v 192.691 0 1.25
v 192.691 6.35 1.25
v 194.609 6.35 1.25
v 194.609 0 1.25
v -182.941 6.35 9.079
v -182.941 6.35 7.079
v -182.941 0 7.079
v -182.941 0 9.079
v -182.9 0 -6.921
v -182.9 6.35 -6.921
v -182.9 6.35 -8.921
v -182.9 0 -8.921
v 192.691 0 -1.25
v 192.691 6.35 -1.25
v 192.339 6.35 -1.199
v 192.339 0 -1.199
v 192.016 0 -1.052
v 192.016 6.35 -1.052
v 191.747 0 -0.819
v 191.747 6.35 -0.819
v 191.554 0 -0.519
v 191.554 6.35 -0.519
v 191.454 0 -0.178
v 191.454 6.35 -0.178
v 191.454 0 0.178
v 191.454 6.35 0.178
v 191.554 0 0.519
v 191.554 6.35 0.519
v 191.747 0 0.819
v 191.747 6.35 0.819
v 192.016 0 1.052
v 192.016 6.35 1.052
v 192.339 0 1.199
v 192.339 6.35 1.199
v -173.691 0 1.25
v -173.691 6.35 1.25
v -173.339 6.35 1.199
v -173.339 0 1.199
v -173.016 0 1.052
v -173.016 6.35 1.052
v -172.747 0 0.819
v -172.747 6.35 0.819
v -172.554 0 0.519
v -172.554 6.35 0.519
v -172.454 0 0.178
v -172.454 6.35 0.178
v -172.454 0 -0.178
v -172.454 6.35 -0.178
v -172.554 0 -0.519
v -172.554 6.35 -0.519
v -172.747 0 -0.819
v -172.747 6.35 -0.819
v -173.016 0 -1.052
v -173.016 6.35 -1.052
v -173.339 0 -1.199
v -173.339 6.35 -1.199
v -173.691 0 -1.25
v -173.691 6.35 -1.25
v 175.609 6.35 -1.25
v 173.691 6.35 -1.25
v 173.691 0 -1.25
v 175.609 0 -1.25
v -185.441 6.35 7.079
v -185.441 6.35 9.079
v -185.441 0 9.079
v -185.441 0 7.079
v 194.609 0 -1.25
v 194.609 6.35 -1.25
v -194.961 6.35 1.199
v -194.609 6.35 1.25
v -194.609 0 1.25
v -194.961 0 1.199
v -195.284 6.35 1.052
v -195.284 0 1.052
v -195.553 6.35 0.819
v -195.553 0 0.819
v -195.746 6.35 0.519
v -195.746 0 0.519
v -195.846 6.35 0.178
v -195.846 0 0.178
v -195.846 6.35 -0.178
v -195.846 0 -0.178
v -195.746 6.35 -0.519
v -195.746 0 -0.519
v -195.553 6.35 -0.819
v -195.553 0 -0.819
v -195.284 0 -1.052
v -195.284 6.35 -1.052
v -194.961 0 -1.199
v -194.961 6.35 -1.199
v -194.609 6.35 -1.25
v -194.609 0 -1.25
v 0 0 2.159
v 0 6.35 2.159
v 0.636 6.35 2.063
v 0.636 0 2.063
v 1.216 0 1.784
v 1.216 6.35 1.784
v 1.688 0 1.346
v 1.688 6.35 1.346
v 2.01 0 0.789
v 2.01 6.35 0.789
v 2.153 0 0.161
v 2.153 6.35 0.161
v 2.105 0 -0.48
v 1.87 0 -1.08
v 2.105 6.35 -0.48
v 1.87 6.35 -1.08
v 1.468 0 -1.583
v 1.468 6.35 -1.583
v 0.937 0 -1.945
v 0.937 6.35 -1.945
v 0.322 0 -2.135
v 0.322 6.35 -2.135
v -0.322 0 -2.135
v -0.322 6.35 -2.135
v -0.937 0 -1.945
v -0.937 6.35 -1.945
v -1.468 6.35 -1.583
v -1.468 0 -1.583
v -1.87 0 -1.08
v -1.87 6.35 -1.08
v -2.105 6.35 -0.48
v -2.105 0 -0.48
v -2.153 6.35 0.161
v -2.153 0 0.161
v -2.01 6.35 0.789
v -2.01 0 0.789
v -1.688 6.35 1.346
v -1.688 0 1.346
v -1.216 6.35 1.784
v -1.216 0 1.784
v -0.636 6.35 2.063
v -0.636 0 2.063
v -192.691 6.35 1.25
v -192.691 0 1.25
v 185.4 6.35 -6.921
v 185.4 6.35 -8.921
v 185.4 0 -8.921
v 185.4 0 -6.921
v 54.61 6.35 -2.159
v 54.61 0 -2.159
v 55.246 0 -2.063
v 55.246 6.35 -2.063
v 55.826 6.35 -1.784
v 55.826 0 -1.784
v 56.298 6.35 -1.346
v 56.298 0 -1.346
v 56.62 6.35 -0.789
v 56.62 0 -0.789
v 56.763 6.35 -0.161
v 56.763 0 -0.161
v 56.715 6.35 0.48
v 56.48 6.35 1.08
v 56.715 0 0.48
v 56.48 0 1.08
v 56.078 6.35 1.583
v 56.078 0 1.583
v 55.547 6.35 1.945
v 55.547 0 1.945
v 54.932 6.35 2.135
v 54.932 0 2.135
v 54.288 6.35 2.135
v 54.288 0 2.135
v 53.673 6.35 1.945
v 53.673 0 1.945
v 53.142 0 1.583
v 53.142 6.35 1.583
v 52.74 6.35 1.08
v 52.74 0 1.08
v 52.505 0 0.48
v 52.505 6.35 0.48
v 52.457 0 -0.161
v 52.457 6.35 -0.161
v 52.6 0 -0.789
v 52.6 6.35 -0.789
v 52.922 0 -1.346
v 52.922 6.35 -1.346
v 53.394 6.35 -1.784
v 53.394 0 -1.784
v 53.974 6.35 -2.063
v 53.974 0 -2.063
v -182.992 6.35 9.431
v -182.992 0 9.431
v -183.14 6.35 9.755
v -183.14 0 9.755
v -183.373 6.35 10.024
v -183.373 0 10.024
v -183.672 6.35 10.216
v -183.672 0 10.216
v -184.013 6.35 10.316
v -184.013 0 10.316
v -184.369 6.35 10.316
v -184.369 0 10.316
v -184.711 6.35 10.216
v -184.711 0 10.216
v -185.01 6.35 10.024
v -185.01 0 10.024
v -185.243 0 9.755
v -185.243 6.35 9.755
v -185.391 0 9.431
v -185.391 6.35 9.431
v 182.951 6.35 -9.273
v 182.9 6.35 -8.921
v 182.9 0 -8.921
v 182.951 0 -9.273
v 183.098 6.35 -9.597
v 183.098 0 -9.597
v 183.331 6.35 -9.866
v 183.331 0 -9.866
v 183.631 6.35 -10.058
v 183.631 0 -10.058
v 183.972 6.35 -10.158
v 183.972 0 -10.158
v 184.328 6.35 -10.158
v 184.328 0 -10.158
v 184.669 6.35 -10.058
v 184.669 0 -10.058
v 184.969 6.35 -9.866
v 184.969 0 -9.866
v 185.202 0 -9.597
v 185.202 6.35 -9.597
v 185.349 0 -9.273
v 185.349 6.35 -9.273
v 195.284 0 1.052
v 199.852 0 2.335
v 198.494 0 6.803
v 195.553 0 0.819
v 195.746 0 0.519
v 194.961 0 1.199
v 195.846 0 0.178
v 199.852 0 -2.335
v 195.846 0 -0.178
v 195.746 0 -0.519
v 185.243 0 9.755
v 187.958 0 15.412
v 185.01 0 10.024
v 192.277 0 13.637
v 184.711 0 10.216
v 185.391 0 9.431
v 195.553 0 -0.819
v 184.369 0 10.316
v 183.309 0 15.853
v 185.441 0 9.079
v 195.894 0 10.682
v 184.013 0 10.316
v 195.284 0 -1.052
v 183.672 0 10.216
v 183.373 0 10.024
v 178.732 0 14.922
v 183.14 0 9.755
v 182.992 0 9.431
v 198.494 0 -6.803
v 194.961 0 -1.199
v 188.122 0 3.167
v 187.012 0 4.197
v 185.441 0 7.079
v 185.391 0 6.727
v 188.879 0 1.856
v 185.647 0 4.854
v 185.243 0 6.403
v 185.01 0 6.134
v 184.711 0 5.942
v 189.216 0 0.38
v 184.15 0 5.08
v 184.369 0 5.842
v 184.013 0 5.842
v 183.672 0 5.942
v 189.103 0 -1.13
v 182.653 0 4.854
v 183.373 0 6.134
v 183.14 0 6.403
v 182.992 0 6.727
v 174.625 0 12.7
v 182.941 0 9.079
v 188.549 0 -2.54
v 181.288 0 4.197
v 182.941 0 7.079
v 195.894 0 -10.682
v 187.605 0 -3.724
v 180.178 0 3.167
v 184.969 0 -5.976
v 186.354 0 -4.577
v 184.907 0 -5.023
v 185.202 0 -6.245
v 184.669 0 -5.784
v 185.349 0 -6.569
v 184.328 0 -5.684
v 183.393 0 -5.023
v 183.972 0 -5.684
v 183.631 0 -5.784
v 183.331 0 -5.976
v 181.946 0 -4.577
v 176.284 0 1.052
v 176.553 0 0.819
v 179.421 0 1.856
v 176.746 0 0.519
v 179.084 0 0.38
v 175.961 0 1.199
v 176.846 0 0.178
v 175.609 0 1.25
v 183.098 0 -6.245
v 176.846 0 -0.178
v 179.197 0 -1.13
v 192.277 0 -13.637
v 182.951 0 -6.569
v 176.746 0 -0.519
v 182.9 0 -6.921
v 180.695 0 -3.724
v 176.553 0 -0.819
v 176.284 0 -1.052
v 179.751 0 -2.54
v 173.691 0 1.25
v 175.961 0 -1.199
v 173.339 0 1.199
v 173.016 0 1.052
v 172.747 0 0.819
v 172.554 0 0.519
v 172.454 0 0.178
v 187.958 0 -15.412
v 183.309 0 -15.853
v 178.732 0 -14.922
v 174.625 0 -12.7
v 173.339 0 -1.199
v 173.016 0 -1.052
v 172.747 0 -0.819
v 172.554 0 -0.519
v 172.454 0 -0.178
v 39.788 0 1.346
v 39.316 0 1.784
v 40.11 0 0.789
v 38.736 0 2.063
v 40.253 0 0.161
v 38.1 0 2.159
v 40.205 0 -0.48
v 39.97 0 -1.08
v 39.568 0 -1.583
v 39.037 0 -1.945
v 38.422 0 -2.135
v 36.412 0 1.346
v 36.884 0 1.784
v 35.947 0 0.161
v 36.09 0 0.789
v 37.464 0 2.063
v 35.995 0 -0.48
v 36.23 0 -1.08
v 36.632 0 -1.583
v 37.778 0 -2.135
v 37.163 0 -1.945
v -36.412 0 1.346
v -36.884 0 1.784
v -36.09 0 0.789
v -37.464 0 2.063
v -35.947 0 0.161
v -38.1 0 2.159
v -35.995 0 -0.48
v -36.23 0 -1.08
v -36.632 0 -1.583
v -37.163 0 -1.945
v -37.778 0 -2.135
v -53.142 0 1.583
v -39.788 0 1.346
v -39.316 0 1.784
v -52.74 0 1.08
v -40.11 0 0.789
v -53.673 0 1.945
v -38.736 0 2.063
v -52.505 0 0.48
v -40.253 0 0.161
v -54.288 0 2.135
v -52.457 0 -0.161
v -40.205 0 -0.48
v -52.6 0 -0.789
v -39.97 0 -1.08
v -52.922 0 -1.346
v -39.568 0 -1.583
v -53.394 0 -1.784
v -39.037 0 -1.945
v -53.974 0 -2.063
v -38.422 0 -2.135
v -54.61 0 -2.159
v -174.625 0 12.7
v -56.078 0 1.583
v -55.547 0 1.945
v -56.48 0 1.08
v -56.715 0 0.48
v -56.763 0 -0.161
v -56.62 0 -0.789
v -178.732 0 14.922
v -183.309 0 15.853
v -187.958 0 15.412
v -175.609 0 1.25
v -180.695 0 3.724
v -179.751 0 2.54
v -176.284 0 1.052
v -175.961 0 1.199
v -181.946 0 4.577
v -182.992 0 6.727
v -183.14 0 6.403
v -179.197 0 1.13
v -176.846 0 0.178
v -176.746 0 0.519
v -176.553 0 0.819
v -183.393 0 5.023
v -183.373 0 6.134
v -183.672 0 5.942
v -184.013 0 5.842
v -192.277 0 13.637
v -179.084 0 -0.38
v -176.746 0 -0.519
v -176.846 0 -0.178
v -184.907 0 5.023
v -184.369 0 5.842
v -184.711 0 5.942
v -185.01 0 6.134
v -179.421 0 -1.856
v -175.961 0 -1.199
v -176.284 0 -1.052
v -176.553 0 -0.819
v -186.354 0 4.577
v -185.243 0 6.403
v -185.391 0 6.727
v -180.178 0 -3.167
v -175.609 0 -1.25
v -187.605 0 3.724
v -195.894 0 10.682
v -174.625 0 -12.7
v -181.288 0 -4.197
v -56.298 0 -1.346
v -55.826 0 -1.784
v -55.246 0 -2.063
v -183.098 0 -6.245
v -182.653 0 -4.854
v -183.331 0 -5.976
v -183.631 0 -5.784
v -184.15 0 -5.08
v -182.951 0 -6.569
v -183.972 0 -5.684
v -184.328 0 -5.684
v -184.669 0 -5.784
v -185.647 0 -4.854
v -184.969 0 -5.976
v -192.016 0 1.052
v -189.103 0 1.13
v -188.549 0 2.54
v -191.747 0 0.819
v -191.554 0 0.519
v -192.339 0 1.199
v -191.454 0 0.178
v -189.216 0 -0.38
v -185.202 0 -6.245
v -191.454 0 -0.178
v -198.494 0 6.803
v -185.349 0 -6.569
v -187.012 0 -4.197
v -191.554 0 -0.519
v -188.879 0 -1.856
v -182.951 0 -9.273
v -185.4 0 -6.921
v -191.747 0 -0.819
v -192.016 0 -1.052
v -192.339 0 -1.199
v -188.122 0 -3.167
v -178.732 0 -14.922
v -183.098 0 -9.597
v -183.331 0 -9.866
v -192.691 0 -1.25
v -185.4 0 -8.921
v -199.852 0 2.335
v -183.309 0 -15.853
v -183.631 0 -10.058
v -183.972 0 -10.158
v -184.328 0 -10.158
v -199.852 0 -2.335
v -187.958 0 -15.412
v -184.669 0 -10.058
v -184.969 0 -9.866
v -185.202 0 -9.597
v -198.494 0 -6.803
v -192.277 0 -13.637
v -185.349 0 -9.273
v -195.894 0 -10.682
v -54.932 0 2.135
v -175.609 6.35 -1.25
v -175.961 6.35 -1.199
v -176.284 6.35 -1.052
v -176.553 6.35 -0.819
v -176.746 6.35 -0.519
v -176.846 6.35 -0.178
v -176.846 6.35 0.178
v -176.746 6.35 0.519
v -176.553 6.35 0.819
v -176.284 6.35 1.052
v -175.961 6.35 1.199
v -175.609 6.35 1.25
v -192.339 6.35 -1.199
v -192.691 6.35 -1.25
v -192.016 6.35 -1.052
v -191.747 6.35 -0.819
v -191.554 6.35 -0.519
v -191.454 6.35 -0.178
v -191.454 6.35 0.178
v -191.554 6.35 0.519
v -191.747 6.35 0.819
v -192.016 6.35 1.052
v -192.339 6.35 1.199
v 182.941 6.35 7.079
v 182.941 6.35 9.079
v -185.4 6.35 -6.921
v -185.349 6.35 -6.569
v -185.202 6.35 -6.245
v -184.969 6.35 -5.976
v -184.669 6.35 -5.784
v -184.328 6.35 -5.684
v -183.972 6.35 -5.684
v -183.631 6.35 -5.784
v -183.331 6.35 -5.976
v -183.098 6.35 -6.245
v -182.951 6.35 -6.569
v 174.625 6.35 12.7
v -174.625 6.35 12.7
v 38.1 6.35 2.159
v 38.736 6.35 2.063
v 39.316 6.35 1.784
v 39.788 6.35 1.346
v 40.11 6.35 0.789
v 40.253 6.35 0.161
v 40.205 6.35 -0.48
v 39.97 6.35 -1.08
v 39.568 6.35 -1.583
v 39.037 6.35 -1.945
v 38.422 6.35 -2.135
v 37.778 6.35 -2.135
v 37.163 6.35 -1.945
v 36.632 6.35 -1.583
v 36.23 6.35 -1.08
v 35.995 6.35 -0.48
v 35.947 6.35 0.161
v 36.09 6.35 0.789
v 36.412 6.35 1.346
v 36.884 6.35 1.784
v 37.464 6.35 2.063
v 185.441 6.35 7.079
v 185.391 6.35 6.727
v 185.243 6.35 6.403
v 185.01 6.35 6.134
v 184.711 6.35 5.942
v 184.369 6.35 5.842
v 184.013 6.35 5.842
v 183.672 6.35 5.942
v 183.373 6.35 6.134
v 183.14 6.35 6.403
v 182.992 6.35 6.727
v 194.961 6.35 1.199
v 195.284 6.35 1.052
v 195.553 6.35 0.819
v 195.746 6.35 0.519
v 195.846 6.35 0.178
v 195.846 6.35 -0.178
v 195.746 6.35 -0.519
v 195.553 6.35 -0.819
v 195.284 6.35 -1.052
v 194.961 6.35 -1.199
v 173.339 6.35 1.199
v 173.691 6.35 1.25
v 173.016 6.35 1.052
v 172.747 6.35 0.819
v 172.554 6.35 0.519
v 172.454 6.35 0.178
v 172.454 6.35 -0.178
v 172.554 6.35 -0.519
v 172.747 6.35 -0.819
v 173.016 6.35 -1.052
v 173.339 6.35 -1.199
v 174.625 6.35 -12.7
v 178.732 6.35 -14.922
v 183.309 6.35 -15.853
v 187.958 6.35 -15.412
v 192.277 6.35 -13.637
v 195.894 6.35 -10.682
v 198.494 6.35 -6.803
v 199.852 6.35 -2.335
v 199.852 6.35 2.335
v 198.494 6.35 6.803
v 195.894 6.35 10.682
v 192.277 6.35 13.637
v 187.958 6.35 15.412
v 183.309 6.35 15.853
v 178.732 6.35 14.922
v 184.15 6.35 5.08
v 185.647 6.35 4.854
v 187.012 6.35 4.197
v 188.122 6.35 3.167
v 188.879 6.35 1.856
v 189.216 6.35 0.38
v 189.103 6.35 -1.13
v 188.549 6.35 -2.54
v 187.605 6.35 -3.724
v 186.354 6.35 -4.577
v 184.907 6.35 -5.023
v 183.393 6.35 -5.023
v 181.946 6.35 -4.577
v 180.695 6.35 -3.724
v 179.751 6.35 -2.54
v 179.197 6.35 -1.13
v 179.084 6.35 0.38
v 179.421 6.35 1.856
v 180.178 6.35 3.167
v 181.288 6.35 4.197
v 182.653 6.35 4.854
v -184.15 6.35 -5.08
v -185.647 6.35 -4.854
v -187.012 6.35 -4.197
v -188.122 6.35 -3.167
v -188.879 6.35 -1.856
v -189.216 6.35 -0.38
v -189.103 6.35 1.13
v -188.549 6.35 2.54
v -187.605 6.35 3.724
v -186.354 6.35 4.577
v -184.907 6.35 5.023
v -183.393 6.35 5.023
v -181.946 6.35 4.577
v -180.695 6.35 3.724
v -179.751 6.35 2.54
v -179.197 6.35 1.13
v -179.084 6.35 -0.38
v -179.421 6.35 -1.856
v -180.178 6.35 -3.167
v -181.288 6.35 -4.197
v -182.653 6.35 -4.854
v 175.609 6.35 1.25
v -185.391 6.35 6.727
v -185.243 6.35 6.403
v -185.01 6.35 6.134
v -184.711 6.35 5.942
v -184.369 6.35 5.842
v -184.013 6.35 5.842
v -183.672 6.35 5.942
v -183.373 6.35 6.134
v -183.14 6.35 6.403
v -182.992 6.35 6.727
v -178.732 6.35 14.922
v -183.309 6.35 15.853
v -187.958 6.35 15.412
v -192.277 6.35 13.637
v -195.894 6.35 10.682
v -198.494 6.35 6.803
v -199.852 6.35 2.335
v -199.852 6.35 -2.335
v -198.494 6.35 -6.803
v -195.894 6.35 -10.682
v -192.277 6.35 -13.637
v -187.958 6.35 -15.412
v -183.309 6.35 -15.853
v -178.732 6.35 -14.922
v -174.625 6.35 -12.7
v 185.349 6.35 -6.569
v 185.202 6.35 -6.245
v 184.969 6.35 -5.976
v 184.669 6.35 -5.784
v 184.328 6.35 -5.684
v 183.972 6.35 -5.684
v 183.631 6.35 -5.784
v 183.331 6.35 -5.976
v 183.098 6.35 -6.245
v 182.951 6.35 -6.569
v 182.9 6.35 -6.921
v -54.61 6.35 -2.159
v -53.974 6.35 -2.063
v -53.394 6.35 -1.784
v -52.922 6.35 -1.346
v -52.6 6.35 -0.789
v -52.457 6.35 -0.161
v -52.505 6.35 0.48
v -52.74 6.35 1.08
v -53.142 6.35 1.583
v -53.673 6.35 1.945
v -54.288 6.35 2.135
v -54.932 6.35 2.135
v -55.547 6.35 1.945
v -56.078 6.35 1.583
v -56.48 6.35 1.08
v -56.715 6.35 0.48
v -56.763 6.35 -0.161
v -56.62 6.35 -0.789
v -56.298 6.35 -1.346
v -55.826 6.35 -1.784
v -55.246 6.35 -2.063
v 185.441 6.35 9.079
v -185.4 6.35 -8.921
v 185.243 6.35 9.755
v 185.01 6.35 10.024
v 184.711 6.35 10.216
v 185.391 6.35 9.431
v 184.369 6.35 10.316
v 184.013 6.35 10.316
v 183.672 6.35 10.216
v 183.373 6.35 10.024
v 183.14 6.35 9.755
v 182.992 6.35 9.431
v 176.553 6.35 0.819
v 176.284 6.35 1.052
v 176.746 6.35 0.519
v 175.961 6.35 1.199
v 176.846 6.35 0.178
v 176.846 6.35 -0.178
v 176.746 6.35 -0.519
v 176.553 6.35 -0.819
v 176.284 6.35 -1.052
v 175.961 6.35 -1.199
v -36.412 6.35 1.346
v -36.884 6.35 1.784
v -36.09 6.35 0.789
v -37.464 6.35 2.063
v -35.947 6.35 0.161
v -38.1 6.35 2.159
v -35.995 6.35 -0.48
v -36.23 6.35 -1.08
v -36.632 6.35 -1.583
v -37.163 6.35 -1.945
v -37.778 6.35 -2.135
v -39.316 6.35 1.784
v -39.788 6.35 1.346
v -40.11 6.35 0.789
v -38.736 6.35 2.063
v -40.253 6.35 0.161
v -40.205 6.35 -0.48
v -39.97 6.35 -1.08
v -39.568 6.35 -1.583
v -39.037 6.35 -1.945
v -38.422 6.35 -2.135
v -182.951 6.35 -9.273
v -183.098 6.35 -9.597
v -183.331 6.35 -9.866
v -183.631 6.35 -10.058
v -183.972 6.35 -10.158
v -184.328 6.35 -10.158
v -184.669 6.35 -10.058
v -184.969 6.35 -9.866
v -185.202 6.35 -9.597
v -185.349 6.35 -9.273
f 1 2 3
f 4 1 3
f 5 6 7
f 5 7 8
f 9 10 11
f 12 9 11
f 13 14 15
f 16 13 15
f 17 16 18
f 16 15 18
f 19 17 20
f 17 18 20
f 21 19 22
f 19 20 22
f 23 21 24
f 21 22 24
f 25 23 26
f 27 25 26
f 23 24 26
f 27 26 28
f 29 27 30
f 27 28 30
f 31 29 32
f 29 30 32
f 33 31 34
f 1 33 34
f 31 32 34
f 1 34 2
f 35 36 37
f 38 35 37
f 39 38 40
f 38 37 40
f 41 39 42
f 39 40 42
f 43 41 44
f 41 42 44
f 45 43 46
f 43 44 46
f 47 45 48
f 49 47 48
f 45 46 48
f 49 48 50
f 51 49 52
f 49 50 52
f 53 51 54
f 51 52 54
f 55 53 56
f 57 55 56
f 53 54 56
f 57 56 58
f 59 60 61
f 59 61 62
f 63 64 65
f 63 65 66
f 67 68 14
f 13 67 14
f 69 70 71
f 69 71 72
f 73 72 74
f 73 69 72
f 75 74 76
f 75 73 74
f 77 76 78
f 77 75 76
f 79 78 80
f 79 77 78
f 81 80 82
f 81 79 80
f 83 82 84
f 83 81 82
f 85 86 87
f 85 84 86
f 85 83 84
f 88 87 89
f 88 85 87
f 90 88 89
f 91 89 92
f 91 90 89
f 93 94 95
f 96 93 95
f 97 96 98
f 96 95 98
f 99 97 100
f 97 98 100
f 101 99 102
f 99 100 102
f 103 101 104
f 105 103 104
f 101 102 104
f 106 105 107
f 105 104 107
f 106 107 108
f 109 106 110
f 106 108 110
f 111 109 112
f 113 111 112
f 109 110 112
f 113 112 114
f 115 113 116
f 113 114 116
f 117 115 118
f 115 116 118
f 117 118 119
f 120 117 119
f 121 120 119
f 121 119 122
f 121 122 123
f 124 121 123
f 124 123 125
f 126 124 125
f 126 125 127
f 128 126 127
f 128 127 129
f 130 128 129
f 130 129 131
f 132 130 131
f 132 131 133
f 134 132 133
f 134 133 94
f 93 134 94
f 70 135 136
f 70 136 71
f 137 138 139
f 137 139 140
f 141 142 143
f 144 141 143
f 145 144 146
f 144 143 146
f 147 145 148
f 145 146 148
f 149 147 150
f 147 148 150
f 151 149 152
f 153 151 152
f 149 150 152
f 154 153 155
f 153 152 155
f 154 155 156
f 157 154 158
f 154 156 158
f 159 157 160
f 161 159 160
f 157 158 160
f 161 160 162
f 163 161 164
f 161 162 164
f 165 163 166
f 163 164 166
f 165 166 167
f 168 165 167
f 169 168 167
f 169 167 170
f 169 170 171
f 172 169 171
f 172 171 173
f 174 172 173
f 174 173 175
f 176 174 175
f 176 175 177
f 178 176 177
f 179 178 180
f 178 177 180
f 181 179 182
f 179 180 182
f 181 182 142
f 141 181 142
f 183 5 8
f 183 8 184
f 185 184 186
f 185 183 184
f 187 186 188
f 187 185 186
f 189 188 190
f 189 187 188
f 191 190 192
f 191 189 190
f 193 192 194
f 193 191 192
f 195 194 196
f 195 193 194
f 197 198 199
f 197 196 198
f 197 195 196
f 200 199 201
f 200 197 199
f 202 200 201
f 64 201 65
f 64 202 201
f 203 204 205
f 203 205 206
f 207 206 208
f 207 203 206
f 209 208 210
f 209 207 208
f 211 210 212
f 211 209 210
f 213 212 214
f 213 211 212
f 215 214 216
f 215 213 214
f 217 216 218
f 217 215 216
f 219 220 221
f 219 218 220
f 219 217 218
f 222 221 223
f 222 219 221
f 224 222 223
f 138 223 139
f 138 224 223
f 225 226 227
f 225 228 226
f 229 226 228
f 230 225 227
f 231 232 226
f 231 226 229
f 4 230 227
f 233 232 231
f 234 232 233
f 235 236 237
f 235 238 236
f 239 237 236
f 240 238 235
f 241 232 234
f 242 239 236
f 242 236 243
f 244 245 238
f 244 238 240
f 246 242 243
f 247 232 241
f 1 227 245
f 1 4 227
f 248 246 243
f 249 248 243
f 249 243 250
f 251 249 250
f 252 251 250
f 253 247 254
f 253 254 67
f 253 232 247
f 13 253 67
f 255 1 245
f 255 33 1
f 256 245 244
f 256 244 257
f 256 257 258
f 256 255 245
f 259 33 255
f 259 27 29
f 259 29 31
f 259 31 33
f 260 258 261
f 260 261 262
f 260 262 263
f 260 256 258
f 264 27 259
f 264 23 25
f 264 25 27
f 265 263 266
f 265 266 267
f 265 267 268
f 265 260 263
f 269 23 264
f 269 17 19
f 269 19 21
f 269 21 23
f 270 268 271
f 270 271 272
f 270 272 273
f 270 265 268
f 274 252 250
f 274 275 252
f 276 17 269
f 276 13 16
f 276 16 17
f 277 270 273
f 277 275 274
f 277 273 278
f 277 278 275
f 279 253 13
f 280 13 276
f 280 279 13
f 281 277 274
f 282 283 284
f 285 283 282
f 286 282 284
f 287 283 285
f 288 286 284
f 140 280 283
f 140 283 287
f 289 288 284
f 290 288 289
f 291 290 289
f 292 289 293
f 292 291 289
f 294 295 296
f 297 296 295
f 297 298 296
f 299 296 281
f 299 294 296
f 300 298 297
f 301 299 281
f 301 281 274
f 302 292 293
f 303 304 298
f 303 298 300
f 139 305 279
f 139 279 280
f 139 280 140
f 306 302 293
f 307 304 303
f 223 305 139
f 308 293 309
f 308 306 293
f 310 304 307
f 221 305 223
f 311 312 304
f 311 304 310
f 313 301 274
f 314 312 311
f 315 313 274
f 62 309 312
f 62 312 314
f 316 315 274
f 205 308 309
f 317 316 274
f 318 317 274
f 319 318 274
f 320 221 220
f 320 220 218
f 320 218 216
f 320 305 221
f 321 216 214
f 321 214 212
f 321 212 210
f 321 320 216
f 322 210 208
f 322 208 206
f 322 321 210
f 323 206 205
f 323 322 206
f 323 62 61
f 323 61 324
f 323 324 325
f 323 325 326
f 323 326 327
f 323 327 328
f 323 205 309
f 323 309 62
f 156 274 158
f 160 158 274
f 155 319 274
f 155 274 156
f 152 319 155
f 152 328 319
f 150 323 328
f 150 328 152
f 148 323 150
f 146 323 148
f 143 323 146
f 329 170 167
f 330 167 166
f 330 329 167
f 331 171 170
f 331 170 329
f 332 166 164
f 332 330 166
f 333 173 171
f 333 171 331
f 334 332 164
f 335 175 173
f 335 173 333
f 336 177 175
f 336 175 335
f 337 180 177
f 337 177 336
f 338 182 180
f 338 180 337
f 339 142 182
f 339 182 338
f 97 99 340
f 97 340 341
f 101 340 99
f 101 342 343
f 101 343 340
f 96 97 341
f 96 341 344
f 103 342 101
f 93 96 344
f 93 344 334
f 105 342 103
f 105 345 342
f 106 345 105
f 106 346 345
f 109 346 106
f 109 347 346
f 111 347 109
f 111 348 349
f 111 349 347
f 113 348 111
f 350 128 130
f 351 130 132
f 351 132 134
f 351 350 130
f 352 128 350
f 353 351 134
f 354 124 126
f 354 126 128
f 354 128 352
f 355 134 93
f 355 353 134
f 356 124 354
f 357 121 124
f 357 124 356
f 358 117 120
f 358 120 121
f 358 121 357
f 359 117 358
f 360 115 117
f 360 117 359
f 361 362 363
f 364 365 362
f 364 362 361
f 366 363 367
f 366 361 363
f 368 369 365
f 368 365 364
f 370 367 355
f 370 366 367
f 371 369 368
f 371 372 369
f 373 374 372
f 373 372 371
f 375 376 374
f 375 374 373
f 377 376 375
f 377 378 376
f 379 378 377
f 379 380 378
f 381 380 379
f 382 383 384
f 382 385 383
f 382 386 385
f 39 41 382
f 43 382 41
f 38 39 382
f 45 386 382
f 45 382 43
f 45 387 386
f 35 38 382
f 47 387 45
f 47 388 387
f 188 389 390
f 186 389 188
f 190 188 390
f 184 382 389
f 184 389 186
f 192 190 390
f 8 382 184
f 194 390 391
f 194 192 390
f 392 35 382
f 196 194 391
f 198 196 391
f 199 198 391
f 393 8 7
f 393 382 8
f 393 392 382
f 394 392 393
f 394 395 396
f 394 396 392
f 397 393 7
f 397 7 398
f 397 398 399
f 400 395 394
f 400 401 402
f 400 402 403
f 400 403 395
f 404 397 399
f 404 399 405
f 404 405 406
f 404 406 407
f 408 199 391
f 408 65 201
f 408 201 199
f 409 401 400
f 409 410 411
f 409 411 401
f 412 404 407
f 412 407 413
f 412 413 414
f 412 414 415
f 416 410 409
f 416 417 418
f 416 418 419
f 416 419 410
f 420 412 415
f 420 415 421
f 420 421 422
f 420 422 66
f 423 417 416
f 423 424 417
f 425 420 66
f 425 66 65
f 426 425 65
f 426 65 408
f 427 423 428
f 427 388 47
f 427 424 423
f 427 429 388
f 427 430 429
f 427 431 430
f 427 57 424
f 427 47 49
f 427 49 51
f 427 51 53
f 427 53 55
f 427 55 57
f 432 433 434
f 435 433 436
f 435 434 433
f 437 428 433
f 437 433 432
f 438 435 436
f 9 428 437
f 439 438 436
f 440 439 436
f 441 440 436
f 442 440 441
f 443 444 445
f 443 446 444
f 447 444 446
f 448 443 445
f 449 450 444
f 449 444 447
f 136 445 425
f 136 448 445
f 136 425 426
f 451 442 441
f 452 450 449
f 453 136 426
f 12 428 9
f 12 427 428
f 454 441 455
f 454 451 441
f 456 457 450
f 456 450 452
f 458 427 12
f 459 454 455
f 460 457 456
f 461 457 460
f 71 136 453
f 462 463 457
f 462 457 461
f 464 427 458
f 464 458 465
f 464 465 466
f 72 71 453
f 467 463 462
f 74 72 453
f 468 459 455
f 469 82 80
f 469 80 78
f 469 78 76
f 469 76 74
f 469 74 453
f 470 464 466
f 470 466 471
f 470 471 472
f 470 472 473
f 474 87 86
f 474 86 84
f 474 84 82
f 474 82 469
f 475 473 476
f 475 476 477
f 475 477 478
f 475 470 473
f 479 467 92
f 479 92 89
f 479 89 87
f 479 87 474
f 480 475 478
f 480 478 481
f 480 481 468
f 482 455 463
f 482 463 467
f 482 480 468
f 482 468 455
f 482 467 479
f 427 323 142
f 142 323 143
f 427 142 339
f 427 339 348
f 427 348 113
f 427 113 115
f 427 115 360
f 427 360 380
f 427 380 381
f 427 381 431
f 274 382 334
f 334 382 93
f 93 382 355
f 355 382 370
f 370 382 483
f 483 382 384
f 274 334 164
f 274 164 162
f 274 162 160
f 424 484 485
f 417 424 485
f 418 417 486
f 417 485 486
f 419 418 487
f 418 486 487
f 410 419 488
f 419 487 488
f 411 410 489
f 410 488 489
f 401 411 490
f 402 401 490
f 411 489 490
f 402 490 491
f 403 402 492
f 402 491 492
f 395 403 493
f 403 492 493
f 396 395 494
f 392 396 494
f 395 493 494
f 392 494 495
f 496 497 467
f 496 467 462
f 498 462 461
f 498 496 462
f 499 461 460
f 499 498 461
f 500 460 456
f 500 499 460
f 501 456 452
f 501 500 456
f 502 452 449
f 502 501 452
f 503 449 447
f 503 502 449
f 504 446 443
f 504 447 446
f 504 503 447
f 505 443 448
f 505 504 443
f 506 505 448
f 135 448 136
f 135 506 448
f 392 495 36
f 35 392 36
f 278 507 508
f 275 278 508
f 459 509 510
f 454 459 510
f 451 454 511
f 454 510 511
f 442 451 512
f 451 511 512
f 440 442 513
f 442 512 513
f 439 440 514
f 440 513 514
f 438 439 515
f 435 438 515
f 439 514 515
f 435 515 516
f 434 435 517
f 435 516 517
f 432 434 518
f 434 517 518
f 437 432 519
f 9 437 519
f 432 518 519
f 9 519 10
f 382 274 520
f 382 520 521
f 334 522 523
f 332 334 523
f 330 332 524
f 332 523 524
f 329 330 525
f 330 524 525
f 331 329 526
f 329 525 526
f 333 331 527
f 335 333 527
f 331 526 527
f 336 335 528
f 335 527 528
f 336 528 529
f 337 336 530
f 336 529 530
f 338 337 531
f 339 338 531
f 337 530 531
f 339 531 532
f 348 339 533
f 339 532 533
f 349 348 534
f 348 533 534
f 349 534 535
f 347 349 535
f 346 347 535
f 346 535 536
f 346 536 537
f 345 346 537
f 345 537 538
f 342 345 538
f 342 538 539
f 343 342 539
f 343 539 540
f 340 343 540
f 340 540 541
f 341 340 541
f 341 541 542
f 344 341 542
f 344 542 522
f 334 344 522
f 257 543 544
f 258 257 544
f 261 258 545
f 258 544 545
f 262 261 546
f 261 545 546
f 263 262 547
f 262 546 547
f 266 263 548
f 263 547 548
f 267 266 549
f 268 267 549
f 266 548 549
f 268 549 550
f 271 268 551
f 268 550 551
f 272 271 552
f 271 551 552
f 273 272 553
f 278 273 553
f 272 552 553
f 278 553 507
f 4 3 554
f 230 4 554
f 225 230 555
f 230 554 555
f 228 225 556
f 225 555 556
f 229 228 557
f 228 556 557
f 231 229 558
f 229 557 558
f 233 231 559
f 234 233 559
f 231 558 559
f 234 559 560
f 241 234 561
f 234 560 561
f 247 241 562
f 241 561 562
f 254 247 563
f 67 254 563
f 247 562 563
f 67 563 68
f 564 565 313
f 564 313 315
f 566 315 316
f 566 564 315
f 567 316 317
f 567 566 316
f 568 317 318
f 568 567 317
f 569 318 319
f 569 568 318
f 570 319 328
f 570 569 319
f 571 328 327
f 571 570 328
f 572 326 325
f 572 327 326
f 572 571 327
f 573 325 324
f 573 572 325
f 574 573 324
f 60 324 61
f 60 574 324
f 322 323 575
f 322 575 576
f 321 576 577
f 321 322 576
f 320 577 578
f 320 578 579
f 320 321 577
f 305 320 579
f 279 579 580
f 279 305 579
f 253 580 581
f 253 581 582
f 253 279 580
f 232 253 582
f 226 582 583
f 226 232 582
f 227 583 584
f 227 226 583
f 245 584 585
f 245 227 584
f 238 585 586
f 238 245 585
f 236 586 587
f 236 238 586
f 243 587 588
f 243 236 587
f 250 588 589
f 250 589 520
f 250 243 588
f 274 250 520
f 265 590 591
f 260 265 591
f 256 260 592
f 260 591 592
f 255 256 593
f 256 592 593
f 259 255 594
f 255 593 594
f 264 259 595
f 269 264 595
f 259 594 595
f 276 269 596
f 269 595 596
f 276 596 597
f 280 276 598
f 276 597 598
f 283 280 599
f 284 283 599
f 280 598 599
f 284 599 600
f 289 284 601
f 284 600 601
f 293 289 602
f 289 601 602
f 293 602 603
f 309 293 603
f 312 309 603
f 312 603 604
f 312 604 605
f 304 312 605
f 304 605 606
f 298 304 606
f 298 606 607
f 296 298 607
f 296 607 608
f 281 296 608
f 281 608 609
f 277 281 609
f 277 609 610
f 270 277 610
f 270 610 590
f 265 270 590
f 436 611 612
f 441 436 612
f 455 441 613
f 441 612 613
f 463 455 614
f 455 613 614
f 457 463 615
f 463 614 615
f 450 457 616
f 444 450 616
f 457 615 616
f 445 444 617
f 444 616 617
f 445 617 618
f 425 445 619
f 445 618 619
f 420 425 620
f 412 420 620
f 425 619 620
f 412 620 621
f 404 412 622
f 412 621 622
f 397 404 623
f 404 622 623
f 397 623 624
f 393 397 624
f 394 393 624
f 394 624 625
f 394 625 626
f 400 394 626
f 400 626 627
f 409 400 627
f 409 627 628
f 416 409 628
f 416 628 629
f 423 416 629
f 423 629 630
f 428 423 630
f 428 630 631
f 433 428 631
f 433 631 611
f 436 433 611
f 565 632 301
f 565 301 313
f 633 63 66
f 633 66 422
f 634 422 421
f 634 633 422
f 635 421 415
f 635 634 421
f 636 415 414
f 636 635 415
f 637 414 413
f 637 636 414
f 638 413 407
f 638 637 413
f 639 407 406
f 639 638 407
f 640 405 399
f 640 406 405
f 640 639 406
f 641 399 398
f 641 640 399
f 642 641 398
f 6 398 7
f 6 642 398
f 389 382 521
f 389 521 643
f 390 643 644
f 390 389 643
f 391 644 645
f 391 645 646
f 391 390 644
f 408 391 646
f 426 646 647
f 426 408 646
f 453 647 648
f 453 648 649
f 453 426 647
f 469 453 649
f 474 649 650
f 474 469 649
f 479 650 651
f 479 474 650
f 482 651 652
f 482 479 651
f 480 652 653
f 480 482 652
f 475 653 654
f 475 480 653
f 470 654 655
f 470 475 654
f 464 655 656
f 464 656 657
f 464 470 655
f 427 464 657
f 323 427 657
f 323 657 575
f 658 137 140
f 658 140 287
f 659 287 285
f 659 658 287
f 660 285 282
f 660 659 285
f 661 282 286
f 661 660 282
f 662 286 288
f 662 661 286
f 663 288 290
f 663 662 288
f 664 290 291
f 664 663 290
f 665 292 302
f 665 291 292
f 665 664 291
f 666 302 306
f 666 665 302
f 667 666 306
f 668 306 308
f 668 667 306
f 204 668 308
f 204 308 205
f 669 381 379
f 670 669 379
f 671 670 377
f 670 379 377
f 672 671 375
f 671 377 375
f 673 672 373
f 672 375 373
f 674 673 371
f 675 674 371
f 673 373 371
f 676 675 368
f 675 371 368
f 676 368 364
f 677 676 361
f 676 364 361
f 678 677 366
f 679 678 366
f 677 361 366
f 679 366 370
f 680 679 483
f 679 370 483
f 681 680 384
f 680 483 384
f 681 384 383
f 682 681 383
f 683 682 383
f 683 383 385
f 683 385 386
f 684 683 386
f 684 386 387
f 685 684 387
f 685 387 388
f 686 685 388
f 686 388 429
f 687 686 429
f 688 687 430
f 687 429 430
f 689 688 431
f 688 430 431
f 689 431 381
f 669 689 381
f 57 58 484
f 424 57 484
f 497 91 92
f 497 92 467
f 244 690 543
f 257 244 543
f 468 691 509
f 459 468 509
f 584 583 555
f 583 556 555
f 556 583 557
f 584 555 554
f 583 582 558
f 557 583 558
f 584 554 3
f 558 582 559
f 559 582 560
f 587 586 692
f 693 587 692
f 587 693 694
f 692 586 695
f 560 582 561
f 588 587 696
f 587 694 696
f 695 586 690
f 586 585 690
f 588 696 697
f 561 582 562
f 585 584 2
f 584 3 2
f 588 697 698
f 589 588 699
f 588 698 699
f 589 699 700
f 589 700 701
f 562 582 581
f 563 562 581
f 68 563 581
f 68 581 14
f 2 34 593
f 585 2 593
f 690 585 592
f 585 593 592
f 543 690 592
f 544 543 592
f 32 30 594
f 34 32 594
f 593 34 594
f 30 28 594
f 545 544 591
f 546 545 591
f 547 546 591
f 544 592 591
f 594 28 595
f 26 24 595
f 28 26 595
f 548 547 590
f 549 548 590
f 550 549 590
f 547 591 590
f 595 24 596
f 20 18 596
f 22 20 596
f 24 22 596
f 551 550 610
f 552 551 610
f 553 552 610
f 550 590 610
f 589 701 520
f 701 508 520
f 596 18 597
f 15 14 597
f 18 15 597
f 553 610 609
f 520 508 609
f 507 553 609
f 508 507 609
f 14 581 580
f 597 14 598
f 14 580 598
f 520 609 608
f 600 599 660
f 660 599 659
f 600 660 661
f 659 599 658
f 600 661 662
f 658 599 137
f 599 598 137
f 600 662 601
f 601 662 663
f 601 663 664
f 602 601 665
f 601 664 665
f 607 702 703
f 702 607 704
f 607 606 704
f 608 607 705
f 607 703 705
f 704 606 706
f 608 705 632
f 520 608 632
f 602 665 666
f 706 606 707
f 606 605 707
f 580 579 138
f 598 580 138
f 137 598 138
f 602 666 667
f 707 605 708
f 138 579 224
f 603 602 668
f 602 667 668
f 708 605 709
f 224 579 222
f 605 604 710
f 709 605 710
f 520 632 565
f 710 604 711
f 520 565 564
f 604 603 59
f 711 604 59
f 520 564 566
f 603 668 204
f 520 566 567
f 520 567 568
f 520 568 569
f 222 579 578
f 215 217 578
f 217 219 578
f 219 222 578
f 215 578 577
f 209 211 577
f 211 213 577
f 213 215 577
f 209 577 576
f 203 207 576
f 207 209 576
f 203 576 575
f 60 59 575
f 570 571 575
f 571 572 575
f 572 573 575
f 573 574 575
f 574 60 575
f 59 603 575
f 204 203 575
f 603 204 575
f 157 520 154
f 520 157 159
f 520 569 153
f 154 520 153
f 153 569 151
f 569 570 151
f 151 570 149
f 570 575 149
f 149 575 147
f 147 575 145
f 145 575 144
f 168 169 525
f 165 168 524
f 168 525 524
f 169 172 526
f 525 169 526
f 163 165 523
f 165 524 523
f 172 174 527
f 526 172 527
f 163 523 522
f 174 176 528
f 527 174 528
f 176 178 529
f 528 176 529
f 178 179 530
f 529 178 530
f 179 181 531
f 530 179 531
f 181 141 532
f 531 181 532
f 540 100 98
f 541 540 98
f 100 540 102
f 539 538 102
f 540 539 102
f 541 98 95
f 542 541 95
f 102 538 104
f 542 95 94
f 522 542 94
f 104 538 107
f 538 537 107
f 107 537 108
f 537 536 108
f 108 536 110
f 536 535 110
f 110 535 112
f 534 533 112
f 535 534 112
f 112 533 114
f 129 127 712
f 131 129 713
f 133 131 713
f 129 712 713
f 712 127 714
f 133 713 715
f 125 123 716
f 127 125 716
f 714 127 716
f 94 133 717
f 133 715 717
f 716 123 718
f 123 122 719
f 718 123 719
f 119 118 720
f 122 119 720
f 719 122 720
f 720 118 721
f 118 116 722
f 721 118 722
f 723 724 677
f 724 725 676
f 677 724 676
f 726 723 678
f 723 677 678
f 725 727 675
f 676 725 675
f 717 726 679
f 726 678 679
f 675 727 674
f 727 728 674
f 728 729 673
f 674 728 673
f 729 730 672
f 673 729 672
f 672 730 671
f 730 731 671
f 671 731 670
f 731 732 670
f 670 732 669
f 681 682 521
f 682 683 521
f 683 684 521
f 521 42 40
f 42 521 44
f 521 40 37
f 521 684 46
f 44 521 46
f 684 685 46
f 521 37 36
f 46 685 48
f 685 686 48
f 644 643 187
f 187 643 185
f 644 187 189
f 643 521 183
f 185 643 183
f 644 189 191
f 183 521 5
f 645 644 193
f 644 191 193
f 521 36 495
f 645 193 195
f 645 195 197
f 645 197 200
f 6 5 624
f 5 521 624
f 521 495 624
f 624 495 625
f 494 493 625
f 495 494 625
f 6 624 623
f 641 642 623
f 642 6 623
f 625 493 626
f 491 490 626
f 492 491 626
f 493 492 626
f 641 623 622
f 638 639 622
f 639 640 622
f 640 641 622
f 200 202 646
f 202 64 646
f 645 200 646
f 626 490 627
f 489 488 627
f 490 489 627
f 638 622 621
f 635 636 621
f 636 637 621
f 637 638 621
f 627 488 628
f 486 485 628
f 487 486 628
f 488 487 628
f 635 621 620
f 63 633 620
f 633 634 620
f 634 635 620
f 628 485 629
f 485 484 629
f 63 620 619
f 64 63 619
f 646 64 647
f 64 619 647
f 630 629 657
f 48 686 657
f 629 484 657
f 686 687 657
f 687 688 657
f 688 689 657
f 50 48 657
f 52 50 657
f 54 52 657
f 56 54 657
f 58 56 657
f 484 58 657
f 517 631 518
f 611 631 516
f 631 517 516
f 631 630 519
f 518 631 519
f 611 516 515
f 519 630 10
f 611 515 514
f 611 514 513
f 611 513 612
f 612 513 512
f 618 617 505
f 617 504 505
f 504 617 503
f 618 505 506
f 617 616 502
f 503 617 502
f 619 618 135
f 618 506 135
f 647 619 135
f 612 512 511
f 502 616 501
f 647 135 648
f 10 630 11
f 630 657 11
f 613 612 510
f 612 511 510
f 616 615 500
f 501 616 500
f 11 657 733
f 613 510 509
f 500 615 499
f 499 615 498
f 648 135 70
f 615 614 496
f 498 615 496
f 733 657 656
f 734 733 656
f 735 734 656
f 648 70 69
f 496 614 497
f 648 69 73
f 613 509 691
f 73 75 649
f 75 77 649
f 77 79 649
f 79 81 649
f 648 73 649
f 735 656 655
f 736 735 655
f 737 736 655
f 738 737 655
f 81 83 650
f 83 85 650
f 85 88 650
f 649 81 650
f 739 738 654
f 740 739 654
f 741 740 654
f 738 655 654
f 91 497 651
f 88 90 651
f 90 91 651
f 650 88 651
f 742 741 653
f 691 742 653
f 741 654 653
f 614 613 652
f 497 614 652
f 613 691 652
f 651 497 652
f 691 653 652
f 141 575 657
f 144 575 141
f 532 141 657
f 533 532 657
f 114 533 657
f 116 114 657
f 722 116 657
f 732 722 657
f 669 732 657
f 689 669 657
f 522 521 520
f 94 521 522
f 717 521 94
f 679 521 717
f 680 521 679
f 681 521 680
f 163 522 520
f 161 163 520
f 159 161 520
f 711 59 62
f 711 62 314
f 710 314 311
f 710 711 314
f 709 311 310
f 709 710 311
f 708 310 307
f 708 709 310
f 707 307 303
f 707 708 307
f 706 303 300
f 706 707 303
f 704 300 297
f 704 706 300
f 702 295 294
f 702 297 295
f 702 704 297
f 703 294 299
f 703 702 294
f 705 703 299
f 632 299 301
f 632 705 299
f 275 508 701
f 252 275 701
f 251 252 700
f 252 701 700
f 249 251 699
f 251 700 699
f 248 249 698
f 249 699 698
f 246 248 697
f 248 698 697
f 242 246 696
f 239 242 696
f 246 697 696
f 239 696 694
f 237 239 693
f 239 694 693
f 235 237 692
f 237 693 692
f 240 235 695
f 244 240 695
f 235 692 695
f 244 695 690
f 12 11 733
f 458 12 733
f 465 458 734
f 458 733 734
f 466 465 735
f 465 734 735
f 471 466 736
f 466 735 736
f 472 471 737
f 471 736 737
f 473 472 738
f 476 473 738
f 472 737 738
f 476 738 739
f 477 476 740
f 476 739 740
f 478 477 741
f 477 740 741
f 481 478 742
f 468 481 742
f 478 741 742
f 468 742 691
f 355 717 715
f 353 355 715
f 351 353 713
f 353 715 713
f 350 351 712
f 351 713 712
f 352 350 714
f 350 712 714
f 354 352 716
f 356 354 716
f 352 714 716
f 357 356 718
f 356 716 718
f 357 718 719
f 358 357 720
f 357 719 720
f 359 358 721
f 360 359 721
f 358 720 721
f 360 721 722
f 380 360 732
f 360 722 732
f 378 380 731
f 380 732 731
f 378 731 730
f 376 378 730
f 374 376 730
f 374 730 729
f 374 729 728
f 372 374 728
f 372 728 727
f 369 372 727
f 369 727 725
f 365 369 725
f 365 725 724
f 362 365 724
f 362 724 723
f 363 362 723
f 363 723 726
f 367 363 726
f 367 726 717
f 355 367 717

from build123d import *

# Parameters (mm, degrees)
BOSS_EXTRUDE1_DEPTH = 6.35
SKETCH2_R           = 5.08
CUT_EXTRUDE1_DEPTH  = 201.754423986
SKETCH3_R           = 2.159
CUT_EXTRUDE2_DEPTH  = 201.754423986
SKETCH6_R           = 2.159
CUT_EXTRUDE3_DEPTH  = 6.35


with BuildPart() as part:
    # Sketch1 → Boss-Extrude1 (new body)
    with BuildSketch(Plane(origin=(0, 0, 0), x_dir=(1, 0, 0), z_dir=(0, 1, 0))):
        with BuildLine():
            Line((-174.625, 12.7), (174.625, 12.7))
            ThreePointArc((174.625, 12.7), (200.025, 0), (174.625, -12.7))
            Line((174.625, -12.7), (-174.625, -12.7))
            ThreePointArc((-174.625, -12.7), (-200.025, 0), (-174.625, 12.7))
        make_face()
    extrude(amount=BOSS_EXTRUDE1_DEPTH)

    # Sketch2 → Cut-Extrude1 (cut, through all)
    with BuildSketch(Plane(origin=(0, 6.35, 0), x_dir=(1, 0, 0), z_dir=(0, 1, 0))):
        with Locations(Location((184.15, 0, 0), (0, 0, 270))):
            Circle(SKETCH2_R)
        with Locations(Location((-184.15, 0, 0), (0, 0, 90))):
            Circle(SKETCH2_R)
        with BuildLine():
            Line((173.691383345, 1.25), (175.608616655, 1.25))
            ThreePointArc((175.608616655, 1.25), (176.858616655, 0), (175.608616655, -1.25))
            Line((175.608616655, -1.25), (173.691383345, -1.25))
            ThreePointArc((173.691383345, -1.25), (172.441383345, 0), (173.691383345, 1.25))
        make_face()
        with BuildLine():
            Line((194.608616655, 1.25), (192.691383345, 1.25))
            ThreePointArc((192.691383345, 1.25), (191.441383345, 0), (192.691383345, -1.25))
            Line((192.691383345, -1.25), (194.608616655, -1.25))
            ThreePointArc((194.608616655, -1.25), (195.858616655, 0), (194.608616655, 1.25))
        make_face()
        with BuildLine():
            Line((185.4, 8.920928665), (185.4, 6.921035691))
            ThreePointArc((185.4, 6.921035691), (184.15, 5.671035691), (182.9, 6.921035691))
            Line((182.9, 6.921035691), (182.9, 8.920928665))
            ThreePointArc((182.9, 8.920928665), (184.15, 10.170928665), (185.4, 8.920928665))
        make_face()
        with BuildLine():
            Line((185.441381345, -9.078964309), (185.441381345, -7.078964309))
            ThreePointArc((185.441381345, -7.078964309), (184.191381345, -5.828964309), (182.941381345, -7.078964309))
            Line((182.941381345, -7.078964309), (182.941381345, -9.078964309))
            ThreePointArc((182.941381345, -9.078964309), (184.191381345, -10.328964309), (185.441381345, -9.078964309))
        make_face()
        with BuildLine():
            Line((-185.441381345, -9.078964309), (-185.441381345, -7.078964309))
            ThreePointArc((-185.441381345, -7.078964309), (-184.191381345, -5.828964309), (-182.941381345, -7.078964309))
            Line((-182.941381345, -7.078964309), (-182.941381345, -9.078964309))
            ThreePointArc((-182.941381345, -9.078964309), (-184.191381345, -10.328964309), (-185.441381345, -9.078964309))
        make_face()
        with BuildLine():
            Line((-185.4, 8.920928665), (-185.4, 6.921035691))
            ThreePointArc((-185.4, 6.921035691), (-184.15, 5.671035691), (-182.9, 6.921035691))
            Line((-182.9, 6.921035691), (-182.9, 8.920928665))
            ThreePointArc((-182.9, 8.920928665), (-184.15, 10.170928665), (-185.4, 8.920928665))
        make_face()
        with BuildLine():
            Line((-194.608616655, 1.25), (-192.691383345, 1.25))
            ThreePointArc((-192.691383345, 1.25), (-191.441383345, 0), (-192.691383345, -1.25))
            Line((-192.691383345, -1.25), (-194.608616655, -1.25))
            ThreePointArc((-194.608616655, -1.25), (-195.858616655, 0), (-194.608616655, 1.25))
        make_face()
        with BuildLine():
            Line((-173.691383345, 1.25), (-175.608616655, 1.25))
            ThreePointArc((-175.608616655, 1.25), (-176.858616655, 0), (-175.608616655, -1.25))
            Line((-175.608616655, -1.25), (-173.691383345, -1.25))
            ThreePointArc((-173.691383345, -1.25), (-172.441383345, 0), (-173.691383345, 1.25))
        make_face()
    extrude(amount=-CUT_EXTRUDE1_DEPTH, mode=Mode.SUBTRACT)

    # Sketch3 → Cut-Extrude2 (cut, through all)
    with BuildSketch(Plane(origin=(0, 6.35, 0), x_dir=(1, 0, 0), z_dir=(0, 1, 0))):
        with Locations(Location((0, 0, 0), (0, 0, 270))):
            Circle(SKETCH3_R)
        with Locations(Location((38.1, 0, 0), (0, 0, 270))):
            Circle(SKETCH3_R)
        with Locations(Location((-38.1, 0, 0), (0, 0, 270))):
            Circle(SKETCH3_R)
    extrude(amount=-CUT_EXTRUDE2_DEPTH, mode=Mode.SUBTRACT)

    # Sketch6 → Cut-Extrude3 (cut)
    with BuildSketch(Plane(origin=(0, 0, 0), x_dir=(-1, 0, 0), z_dir=(0, -1, 0))):
        with Locations(Location((54.61, 0, 0), (0, 0, 90))):
            Circle(SKETCH6_R)
        with Locations(Location((-54.61, 0, 0), (0, 0, 90))):
            Circle(SKETCH6_R)
    extrude(amount=-CUT_EXTRUDE3_DEPTH, mode=Mode.SUBTRACT)


solid = part.part
